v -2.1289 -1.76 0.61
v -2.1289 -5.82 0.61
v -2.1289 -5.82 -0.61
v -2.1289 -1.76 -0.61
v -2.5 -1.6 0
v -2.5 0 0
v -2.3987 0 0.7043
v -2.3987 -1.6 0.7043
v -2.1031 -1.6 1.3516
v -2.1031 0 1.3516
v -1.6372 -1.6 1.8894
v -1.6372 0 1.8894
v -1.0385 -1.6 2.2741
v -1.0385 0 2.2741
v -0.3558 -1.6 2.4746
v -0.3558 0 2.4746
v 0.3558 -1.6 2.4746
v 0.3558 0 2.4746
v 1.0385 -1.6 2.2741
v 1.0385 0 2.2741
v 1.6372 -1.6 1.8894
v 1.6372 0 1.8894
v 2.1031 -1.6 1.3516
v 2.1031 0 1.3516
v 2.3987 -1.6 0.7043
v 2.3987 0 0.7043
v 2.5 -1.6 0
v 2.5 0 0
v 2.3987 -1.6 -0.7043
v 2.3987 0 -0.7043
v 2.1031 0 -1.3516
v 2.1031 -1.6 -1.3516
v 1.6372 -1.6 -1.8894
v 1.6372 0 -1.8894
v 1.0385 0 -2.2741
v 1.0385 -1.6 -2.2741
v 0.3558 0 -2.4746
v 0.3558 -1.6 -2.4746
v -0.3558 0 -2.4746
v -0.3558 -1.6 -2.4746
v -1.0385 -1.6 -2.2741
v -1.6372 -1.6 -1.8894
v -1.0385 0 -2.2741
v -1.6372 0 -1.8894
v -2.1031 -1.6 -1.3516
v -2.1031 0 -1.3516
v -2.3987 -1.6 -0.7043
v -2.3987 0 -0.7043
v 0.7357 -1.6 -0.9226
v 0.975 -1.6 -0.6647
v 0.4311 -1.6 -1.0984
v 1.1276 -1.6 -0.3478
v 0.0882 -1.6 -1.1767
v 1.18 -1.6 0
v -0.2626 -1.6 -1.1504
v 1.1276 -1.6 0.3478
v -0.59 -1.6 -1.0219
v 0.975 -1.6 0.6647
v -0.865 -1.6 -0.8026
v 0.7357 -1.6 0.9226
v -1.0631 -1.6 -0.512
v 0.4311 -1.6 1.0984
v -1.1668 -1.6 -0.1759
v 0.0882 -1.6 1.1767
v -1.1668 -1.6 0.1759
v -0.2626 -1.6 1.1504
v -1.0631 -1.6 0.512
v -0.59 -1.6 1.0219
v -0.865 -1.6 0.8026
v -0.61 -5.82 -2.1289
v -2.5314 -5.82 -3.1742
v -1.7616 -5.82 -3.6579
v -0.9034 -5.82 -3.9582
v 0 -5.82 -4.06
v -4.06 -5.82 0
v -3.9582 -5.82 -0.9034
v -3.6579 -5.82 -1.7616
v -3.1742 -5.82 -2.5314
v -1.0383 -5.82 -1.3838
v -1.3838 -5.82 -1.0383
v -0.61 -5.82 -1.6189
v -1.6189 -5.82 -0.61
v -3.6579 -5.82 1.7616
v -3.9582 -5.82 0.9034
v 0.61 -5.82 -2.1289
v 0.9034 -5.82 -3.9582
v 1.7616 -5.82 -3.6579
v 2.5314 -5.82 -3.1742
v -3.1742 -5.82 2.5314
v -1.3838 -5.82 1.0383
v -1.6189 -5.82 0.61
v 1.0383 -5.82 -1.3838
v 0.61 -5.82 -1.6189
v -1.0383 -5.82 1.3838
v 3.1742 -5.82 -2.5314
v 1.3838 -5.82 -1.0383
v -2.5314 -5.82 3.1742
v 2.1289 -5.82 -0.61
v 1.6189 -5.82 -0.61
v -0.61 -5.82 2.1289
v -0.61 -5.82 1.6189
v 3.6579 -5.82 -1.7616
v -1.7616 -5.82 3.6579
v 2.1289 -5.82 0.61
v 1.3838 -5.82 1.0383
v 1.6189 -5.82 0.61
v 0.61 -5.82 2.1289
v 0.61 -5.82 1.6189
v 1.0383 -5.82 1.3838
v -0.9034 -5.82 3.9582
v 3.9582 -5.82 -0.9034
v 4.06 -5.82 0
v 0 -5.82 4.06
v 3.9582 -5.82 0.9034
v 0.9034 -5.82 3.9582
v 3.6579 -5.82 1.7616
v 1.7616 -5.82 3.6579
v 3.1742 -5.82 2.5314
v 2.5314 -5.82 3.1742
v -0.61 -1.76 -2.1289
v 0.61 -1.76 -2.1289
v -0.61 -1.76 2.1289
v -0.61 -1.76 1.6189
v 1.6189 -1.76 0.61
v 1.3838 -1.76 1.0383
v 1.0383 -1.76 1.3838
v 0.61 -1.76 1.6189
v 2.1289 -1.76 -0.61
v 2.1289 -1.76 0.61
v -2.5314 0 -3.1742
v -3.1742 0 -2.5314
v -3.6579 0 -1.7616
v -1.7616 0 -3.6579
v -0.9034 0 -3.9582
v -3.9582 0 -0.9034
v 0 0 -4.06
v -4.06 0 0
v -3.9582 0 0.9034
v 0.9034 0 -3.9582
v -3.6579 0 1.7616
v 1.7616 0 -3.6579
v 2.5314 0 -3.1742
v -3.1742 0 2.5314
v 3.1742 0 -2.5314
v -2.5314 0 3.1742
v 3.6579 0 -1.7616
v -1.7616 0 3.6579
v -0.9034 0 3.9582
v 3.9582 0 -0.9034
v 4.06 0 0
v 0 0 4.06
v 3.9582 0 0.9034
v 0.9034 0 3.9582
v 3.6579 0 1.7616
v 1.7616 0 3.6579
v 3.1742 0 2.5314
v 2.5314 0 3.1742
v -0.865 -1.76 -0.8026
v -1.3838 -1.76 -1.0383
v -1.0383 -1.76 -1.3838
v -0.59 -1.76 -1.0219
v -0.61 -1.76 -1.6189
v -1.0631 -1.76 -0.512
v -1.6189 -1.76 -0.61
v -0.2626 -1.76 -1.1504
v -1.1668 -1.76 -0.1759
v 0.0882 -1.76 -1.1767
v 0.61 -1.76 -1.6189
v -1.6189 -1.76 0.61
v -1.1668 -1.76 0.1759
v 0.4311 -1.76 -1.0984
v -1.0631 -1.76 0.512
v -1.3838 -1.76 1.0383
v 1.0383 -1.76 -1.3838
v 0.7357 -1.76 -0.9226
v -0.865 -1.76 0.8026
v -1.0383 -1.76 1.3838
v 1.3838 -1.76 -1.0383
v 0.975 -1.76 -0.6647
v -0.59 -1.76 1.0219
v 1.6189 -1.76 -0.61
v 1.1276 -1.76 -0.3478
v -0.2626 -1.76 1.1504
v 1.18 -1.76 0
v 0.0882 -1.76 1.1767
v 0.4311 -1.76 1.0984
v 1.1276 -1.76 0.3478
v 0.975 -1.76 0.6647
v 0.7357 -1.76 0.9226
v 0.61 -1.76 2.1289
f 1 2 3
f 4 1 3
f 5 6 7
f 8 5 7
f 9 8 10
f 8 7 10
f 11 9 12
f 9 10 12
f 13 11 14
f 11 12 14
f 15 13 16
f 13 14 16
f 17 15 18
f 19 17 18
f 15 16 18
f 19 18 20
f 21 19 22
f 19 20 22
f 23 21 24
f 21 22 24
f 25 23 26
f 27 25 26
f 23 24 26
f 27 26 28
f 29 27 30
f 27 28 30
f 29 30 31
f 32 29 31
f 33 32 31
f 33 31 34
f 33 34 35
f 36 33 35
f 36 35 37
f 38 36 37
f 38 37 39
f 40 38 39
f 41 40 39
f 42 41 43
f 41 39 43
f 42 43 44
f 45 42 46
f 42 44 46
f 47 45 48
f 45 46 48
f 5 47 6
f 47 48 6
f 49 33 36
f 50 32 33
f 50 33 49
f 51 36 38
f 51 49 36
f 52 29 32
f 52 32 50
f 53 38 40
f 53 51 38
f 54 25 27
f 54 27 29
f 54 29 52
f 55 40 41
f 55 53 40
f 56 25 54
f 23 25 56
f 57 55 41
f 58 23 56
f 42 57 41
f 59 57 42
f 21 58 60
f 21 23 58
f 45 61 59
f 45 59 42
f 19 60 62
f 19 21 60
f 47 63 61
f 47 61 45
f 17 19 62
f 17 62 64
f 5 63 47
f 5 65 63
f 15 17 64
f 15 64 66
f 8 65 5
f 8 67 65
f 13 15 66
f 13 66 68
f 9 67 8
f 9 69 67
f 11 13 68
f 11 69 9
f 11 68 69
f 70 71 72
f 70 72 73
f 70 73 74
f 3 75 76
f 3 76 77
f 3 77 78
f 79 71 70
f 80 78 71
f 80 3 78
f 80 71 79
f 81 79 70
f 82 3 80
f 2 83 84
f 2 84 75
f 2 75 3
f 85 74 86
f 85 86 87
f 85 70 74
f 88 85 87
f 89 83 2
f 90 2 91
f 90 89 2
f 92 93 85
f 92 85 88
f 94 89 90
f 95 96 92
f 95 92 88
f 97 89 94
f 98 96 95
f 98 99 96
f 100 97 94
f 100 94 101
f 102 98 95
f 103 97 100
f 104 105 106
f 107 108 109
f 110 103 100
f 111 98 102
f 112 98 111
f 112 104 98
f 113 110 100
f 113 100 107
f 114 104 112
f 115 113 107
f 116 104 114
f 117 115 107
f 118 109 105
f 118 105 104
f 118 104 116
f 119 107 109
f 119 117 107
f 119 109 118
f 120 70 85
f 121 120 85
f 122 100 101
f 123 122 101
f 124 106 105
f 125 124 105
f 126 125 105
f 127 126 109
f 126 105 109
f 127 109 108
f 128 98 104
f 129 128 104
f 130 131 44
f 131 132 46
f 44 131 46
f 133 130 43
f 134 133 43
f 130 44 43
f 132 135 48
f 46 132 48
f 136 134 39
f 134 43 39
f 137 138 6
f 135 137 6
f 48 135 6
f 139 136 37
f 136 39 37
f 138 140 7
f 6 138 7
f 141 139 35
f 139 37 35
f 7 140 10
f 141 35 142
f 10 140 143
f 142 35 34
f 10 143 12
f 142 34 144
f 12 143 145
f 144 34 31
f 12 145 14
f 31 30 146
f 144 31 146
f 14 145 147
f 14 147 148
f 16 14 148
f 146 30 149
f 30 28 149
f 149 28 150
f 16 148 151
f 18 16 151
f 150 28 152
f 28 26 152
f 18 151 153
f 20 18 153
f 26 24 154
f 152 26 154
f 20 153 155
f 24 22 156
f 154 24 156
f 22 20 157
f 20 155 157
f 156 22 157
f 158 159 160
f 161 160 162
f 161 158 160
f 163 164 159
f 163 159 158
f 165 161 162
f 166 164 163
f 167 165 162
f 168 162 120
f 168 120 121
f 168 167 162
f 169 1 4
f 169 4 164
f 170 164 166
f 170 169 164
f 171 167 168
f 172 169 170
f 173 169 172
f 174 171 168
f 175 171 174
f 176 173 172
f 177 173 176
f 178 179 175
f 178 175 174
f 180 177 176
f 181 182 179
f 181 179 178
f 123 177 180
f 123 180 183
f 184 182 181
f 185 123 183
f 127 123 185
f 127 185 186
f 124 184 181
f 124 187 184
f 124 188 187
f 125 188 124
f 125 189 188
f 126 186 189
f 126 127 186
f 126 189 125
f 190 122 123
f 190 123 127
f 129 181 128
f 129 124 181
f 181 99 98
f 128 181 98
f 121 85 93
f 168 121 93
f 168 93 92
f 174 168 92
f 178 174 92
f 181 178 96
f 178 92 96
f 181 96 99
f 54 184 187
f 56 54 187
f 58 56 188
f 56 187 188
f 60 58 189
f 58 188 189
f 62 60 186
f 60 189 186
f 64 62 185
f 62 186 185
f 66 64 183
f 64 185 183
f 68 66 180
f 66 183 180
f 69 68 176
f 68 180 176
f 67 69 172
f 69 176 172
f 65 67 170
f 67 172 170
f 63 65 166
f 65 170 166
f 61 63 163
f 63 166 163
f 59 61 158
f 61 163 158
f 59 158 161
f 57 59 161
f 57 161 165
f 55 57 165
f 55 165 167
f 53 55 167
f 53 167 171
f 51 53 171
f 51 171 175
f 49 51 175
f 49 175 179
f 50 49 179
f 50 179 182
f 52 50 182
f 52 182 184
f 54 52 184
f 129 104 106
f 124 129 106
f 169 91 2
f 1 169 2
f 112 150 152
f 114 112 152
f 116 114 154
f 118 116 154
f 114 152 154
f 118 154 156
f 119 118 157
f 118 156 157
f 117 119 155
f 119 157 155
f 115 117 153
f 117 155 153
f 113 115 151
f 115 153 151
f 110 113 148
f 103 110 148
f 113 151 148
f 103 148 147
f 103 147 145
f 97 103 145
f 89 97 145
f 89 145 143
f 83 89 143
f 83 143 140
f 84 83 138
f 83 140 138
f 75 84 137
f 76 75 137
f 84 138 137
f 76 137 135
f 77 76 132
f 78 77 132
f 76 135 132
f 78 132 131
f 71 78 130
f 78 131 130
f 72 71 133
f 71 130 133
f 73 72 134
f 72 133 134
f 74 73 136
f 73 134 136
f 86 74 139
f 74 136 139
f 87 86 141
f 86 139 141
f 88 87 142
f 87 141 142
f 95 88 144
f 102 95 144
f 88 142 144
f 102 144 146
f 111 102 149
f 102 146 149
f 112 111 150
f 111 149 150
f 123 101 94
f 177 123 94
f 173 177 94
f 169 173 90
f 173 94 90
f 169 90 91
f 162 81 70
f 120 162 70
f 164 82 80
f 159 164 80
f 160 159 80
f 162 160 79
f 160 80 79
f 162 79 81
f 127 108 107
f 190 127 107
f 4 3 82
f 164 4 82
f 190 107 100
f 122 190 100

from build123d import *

# Parameters (mm, degrees)
F0_R     = 4.06
F1_DEPTH = 5.82
F3_DEPTH = 4.06
F4_R     = 1.18
F5_DEPTH = 25
F6_R     = 2.5
F6_R_2   = 1.18
F7_DEPTH = 1.6


# Not quite as in the source:
# - a feature names something its author has since deleted; it is built from what else it names


with BuildPart() as f1:
    # F0 (on Front) → F1 (new body)
    with BuildSketch(Plane.XZ):
        Circle(F0_R)
    extrude(amount=F1_DEPTH)

    # F2 (on face) → F3 (cut)
    with BuildSketch(Plane.XZ.offset(5.82)):
        with BuildLine():
            ThreePointArc((1.6188885076, -0.61), (1.7019954639, -0.3100184526), (1.73, 0))
            ThreePointArc((1.73, 0), (1.7019954639, 0.3100184526), (1.6188885076, 0.61))
            ThreePointArc((1.6188885076, 0.61), (1.2232947315, 1.2232947315), (0.61, 1.6188885076))
            ThreePointArc((0.61, 1.6188885076), (0, 1.73), (-0.61, 1.6188885076))
            ThreePointArc((-0.61, 1.6188885076), (-1.2232947315, 1.2232947315), (-1.6188885076, 0.61))
            ThreePointArc((-1.6188885076, 0.61), (-1.73, 0), (-1.6188885076, -0.61))
            ThreePointArc((-1.6188885076, -0.61), (-1.2232947315, -1.2232947315), (-0.61, -1.6188885076))
            ThreePointArc((-0.61, -1.6188885076), (0, -1.73), (0.61, -1.6188885076))
            ThreePointArc((0.61, -1.6188885076), (1.2232947315, -1.2232947315), (1.6188885076, -0.61))
        make_face()
        with BuildLine():
            ThreePointArc((1.6188885076, 0.61), (1.7019954639, 0.3100184526), (1.73, 0))
            ThreePointArc((1.73, 0), (1.7019954639, -0.3100184526), (1.6188885076, -0.61))
            Line((1.6188885076, -0.61), (2.1288885076, -0.61))
            Line((2.1288885076, -0.61), (2.1288885076, 0.61))
            Line((2.1288885076, 0.61), (1.6188885076, 0.61))
        make_face()
        with BuildLine():
            ThreePointArc((-0.61, 1.6188885076), (0, 1.73), (0.61, 1.6188885076))
            Line((0.61, 1.6188885076), (0.61, 2.1288885076))
            Line((0.61, 2.1288885076), (-0.61, 2.1288885076))
            Line((-0.61, 2.1288885076), (-0.61, 1.6188885076))
        make_face()
        with BuildLine():
            Line((0.61, -2.1288885076), (0.61, -1.6188885076))
            ThreePointArc((0.61, -1.6188885076), (0, -1.73), (-0.61, -1.6188885076))
            Line((-0.61, -1.6188885076), (-0.61, -2.1288885076))
            Line((-0.61, -2.1288885076), (0.61, -2.1288885076))
        make_face()
        with BuildLine():
            ThreePointArc((-1.6188885076, -0.61), (-1.73, 0), (-1.6188885076, 0.61))
            Line((-1.6188885076, 0.61), (-2.1288885076, 0.61))
            Line((-2.1288885076, 0.61), (-2.1288885076, -0.61))
            Line((-2.1288885076, -0.61), (-1.6188885076, -0.61))
        make_face()
    extrude(amount=-F3_DEPTH, mode=Mode.SUBTRACT)

    # F4 (on face) → F5 (cut)
    with BuildSketch(Plane.XZ.offset(1.76)):
        Circle(F4_R)
    extrude(amount=-F5_DEPTH, mode=Mode.SUBTRACT)

    # F6 (on face) → F7 (cut)
    with BuildSketch(Plane(origin=(0, 0, 0), x_dir=(-1, 0, 0), z_dir=(0, 1, 0))):
        Circle(F6_R)
        Circle(F6_R_2, mode=Mode.SUBTRACT)
    extrude(amount=-F7_DEPTH, mode=Mode.SUBTRACT)


solid = f1.part
